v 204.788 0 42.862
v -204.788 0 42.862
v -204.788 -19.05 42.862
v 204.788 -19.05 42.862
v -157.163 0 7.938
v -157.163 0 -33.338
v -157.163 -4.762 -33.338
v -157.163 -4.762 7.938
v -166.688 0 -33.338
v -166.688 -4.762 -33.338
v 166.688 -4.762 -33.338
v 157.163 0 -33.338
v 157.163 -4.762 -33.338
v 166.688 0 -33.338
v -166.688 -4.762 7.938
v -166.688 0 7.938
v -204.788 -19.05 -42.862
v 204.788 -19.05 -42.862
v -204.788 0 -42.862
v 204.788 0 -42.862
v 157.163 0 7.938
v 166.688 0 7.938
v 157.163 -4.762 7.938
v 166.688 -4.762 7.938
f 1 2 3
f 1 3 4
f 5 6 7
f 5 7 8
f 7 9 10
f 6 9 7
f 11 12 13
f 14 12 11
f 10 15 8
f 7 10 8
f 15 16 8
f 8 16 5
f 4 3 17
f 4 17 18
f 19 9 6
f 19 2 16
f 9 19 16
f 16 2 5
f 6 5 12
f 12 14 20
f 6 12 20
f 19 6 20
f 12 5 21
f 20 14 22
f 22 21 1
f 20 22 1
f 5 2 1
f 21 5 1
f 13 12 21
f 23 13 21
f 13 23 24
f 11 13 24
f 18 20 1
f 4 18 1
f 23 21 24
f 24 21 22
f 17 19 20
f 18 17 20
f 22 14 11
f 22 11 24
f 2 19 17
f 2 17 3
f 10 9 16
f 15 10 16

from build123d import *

# Parameters (mm, degrees)
F0_W     = 409.575
F0_H     = 85.725
F0_W_2   = 9.525
F0_H_2   = 41.275
F1_DEPTH = 19.05
F2_DEPTH = 4.7625


with BuildPart() as f1:
    # F0 (on Front) → F1 (new body)
    with BuildSketch(Plane.XZ):
        Rectangle(F0_W, F0_H)
        with Locations((-161.925, -12.7)):
            Rectangle(F0_W_2, F0_H_2, mode=Mode.SUBTRACT)
        with Locations((161.925, -12.7)):
            Rectangle(F0_W_2, F0_H_2, mode=Mode.SUBTRACT)
        with Locations((161.925, -12.7)):
            Rectangle(F0_W_2, F0_H_2)
        with Locations((-161.925, -12.7)):
            Rectangle(F0_W_2, F0_H_2)
    extrude(amount=F1_DEPTH)

    # F0 (on Front) → F2 (cut)
    with BuildSketch(Plane.XZ):
        with Locations((161.925, -12.7)):
            Rectangle(F0_W_2, F0_H_2)
        with Locations((-161.925, -12.7)):
            Rectangle(F0_W_2, F0_H_2)
    extrude(amount=F2_DEPTH, mode=Mode.SUBTRACT)


solid = f1.part
